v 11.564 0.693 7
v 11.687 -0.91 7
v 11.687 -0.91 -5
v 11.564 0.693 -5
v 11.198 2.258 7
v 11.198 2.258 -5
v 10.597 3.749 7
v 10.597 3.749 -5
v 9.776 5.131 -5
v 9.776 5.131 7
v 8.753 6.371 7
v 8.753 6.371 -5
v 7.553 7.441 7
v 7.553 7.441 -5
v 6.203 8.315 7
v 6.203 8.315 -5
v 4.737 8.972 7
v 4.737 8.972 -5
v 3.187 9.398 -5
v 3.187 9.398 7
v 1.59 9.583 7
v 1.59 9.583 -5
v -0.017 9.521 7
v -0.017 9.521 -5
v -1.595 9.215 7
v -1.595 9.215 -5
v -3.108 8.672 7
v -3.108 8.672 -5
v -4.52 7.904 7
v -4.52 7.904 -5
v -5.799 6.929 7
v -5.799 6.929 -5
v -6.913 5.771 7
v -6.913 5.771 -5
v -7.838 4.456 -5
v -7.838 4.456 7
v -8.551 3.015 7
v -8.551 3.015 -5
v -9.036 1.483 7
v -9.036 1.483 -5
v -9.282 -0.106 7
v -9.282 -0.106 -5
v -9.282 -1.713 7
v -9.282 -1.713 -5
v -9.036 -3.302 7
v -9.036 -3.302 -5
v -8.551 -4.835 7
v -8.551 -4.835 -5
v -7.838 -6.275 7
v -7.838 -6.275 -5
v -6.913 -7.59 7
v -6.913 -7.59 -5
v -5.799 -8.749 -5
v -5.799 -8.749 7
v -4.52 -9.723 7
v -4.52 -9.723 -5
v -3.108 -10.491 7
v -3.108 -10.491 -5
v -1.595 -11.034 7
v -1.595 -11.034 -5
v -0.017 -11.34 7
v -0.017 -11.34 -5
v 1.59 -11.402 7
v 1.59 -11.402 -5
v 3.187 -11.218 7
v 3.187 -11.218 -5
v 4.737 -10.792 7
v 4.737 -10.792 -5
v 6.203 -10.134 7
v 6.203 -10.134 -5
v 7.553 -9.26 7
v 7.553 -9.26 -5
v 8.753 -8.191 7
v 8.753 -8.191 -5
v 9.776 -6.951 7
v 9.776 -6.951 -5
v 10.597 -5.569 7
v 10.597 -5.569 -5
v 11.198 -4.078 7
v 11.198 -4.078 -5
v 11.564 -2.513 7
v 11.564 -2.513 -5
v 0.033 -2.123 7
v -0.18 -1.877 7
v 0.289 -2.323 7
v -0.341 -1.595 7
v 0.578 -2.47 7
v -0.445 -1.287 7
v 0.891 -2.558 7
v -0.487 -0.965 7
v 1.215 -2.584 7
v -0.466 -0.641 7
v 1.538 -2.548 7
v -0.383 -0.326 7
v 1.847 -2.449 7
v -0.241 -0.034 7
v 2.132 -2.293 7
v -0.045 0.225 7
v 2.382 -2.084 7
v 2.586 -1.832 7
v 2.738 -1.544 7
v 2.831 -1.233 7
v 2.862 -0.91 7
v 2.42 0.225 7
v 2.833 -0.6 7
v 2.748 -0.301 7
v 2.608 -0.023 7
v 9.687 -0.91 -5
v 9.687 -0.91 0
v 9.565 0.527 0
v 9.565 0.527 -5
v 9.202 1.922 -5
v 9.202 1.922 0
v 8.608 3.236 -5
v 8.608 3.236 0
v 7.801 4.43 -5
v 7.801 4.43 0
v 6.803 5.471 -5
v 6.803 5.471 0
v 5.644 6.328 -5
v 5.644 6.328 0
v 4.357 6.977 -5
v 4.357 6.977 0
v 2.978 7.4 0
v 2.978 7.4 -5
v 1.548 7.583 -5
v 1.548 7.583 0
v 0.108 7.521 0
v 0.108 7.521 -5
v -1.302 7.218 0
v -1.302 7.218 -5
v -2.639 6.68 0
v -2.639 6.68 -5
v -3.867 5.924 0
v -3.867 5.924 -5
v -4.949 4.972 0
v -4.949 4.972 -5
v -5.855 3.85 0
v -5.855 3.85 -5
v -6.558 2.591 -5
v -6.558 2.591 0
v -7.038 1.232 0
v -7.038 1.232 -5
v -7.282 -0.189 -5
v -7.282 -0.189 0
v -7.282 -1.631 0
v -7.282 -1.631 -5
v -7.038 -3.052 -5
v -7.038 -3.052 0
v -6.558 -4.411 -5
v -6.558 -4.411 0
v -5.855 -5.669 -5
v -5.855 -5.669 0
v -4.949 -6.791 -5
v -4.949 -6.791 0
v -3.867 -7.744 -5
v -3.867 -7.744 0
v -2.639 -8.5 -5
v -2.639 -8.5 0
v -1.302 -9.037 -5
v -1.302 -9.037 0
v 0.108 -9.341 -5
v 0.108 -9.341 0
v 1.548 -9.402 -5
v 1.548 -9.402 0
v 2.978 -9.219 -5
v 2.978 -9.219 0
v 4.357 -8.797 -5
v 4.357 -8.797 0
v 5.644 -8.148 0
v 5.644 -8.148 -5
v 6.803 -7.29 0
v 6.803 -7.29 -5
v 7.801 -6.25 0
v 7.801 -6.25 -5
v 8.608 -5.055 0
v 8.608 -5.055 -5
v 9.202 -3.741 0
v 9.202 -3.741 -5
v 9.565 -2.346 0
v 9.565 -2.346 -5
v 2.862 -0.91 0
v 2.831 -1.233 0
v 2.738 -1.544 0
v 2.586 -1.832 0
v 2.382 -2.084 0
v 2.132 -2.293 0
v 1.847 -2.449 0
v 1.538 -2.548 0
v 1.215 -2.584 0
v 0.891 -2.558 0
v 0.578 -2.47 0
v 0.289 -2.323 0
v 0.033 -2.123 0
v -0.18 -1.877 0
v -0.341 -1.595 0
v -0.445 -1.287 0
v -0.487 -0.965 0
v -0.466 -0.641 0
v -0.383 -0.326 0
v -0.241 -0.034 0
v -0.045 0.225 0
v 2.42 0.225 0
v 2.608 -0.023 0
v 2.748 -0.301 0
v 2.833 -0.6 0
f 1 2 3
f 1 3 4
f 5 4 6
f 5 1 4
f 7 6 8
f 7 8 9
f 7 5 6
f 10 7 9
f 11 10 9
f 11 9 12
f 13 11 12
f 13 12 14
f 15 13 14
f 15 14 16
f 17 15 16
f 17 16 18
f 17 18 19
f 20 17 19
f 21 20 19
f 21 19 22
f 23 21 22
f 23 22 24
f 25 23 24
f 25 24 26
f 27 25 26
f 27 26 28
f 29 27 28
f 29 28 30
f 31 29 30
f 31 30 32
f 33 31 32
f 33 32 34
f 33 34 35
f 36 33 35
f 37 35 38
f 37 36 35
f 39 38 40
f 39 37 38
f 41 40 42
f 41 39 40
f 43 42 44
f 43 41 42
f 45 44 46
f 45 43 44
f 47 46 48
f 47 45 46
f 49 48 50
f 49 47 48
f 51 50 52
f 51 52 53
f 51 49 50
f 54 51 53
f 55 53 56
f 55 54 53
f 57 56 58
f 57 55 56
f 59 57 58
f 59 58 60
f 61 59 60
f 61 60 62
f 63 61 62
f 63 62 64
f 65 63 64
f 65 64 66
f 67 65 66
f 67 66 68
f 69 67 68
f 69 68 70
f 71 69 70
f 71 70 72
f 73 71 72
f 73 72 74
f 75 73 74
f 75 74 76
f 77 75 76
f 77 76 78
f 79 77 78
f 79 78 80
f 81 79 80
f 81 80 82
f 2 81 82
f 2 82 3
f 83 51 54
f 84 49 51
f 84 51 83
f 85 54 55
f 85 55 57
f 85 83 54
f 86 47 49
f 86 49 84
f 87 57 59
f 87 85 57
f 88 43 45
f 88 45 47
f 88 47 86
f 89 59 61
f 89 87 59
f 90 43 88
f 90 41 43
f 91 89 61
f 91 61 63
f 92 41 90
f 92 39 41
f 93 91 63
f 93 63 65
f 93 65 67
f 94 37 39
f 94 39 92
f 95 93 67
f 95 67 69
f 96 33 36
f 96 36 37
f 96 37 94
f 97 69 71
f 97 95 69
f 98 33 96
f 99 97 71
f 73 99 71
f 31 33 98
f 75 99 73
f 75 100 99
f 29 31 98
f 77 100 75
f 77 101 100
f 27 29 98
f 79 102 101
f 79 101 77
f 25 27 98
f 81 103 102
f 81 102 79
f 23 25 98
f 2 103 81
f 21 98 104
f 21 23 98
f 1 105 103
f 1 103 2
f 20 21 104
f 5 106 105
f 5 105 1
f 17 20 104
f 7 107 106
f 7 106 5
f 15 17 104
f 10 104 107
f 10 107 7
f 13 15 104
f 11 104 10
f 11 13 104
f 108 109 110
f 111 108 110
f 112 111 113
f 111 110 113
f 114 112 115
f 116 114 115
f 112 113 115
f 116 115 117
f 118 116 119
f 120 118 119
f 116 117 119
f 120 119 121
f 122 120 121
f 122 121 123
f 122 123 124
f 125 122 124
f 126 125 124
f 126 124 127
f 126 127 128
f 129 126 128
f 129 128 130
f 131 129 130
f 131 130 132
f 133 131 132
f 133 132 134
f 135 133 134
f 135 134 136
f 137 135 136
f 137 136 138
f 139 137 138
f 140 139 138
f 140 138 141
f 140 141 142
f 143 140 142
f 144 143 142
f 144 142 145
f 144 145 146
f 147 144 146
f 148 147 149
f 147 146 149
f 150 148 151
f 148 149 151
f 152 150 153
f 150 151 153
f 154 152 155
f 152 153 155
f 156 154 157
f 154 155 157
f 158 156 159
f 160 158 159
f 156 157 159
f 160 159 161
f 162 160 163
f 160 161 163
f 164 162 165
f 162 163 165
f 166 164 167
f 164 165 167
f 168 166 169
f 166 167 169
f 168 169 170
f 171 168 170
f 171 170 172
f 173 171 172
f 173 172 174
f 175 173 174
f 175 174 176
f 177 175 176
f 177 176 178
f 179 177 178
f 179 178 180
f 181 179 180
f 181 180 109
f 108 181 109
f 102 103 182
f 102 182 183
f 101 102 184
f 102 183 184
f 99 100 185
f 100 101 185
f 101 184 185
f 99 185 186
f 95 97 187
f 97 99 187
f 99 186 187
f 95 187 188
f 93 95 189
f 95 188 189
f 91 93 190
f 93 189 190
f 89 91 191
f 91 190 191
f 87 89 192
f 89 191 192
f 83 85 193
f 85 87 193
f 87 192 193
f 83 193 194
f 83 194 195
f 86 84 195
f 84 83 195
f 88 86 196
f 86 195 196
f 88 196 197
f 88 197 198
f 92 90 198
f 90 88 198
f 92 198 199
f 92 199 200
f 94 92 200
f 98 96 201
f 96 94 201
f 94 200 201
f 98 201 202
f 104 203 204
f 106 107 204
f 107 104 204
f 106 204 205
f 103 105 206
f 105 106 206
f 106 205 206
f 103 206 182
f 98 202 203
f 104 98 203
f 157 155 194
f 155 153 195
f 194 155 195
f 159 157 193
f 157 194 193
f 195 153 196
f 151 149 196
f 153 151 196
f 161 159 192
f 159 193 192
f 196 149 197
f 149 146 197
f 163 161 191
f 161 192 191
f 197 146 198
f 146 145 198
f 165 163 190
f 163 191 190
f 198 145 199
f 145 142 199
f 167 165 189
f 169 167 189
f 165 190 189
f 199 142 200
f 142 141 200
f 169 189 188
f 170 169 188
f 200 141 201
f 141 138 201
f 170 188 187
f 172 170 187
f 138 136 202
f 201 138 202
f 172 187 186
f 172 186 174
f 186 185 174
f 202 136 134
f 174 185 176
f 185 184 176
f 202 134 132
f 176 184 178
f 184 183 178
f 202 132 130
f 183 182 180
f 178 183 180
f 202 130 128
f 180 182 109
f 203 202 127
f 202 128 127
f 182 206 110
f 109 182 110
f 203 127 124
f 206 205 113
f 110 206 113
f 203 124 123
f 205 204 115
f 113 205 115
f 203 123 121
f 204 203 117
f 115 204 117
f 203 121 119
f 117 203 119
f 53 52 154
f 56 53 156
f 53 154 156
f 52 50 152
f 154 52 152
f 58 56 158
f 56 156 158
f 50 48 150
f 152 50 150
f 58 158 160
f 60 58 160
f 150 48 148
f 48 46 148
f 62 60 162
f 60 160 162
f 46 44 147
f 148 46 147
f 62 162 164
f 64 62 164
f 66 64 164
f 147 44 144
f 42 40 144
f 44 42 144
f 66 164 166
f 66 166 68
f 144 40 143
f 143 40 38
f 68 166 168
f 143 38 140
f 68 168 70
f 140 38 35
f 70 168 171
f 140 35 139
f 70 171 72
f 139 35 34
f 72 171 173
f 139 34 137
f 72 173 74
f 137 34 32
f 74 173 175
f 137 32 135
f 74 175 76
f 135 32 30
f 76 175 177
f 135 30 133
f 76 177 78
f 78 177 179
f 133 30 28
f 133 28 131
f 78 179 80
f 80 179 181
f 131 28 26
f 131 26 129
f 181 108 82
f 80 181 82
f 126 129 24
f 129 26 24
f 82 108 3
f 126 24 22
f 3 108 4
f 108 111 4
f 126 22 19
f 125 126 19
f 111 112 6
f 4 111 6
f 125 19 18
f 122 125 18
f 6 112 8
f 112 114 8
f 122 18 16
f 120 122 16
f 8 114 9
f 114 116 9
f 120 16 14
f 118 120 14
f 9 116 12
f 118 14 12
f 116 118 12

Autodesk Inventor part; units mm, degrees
ref_plane "YZ Plane" through (0, 0, 0) normal (1, 0, 0) x (0, 1, 0)
ref_plane "XZ Plane" through (0, 0, 0) normal (0, 1, 0) x (-1, 0, 0)
ref_plane "XY Plane" through (0, 0, 0) normal (0, 0, 1) x (1, 0, 0)
sketch "Szkic1" plane through (0, 0, 0) normal (0, 0, 1) x (1, 0, 0)
  line L0 (2.3165, 0) -> (0.0582, 0) construction
  arc A0 (1.1874, -2.3597) -> (2.3165, 0) centre (1.1874, -0.9097) ccw construction
  arc A1 (0.0582, 0) -> (1.1874, -2.3597) centre (1.1874, -0.9097) ccw construction
  circle A2 centre (1.1874, -0.9097) radius 10.5
  line L1 (-0.0447, 0.225) -> (2.4195, 0.225)
  arc A3 (2.8624, -0.9097) -> (2.4195, 0.225) centre (1.1874, -0.9097) ccw
  arc A4 (-0.0447, 0.225) -> (2.8624, -0.9097) centre (1.1874, -0.9097) ccw
  circle A5 centre (1.1874, -0.9097) radius 8.5
  point P0 (0, 0)
  dimension "d0" = 21
  dimension "d7" = 1.45
  dimension "d8" = 0.225
  dimension "d9" = 17
extrude "Wyciągnięcie proste1" add sketch "Szkic1" along normal blind 7 contours A2 | A5
sketch "Szkic3" plane through (1.1874, -0.9097, 0) normal (0, 0, -1) x (-1, 0, 0)
  point P0 (1.1874, 0.9097)
extrude "Wyciągnięcie proste3" add sketch "Szkic1" against normal blind 5 contours A2
properties part number "felga"
